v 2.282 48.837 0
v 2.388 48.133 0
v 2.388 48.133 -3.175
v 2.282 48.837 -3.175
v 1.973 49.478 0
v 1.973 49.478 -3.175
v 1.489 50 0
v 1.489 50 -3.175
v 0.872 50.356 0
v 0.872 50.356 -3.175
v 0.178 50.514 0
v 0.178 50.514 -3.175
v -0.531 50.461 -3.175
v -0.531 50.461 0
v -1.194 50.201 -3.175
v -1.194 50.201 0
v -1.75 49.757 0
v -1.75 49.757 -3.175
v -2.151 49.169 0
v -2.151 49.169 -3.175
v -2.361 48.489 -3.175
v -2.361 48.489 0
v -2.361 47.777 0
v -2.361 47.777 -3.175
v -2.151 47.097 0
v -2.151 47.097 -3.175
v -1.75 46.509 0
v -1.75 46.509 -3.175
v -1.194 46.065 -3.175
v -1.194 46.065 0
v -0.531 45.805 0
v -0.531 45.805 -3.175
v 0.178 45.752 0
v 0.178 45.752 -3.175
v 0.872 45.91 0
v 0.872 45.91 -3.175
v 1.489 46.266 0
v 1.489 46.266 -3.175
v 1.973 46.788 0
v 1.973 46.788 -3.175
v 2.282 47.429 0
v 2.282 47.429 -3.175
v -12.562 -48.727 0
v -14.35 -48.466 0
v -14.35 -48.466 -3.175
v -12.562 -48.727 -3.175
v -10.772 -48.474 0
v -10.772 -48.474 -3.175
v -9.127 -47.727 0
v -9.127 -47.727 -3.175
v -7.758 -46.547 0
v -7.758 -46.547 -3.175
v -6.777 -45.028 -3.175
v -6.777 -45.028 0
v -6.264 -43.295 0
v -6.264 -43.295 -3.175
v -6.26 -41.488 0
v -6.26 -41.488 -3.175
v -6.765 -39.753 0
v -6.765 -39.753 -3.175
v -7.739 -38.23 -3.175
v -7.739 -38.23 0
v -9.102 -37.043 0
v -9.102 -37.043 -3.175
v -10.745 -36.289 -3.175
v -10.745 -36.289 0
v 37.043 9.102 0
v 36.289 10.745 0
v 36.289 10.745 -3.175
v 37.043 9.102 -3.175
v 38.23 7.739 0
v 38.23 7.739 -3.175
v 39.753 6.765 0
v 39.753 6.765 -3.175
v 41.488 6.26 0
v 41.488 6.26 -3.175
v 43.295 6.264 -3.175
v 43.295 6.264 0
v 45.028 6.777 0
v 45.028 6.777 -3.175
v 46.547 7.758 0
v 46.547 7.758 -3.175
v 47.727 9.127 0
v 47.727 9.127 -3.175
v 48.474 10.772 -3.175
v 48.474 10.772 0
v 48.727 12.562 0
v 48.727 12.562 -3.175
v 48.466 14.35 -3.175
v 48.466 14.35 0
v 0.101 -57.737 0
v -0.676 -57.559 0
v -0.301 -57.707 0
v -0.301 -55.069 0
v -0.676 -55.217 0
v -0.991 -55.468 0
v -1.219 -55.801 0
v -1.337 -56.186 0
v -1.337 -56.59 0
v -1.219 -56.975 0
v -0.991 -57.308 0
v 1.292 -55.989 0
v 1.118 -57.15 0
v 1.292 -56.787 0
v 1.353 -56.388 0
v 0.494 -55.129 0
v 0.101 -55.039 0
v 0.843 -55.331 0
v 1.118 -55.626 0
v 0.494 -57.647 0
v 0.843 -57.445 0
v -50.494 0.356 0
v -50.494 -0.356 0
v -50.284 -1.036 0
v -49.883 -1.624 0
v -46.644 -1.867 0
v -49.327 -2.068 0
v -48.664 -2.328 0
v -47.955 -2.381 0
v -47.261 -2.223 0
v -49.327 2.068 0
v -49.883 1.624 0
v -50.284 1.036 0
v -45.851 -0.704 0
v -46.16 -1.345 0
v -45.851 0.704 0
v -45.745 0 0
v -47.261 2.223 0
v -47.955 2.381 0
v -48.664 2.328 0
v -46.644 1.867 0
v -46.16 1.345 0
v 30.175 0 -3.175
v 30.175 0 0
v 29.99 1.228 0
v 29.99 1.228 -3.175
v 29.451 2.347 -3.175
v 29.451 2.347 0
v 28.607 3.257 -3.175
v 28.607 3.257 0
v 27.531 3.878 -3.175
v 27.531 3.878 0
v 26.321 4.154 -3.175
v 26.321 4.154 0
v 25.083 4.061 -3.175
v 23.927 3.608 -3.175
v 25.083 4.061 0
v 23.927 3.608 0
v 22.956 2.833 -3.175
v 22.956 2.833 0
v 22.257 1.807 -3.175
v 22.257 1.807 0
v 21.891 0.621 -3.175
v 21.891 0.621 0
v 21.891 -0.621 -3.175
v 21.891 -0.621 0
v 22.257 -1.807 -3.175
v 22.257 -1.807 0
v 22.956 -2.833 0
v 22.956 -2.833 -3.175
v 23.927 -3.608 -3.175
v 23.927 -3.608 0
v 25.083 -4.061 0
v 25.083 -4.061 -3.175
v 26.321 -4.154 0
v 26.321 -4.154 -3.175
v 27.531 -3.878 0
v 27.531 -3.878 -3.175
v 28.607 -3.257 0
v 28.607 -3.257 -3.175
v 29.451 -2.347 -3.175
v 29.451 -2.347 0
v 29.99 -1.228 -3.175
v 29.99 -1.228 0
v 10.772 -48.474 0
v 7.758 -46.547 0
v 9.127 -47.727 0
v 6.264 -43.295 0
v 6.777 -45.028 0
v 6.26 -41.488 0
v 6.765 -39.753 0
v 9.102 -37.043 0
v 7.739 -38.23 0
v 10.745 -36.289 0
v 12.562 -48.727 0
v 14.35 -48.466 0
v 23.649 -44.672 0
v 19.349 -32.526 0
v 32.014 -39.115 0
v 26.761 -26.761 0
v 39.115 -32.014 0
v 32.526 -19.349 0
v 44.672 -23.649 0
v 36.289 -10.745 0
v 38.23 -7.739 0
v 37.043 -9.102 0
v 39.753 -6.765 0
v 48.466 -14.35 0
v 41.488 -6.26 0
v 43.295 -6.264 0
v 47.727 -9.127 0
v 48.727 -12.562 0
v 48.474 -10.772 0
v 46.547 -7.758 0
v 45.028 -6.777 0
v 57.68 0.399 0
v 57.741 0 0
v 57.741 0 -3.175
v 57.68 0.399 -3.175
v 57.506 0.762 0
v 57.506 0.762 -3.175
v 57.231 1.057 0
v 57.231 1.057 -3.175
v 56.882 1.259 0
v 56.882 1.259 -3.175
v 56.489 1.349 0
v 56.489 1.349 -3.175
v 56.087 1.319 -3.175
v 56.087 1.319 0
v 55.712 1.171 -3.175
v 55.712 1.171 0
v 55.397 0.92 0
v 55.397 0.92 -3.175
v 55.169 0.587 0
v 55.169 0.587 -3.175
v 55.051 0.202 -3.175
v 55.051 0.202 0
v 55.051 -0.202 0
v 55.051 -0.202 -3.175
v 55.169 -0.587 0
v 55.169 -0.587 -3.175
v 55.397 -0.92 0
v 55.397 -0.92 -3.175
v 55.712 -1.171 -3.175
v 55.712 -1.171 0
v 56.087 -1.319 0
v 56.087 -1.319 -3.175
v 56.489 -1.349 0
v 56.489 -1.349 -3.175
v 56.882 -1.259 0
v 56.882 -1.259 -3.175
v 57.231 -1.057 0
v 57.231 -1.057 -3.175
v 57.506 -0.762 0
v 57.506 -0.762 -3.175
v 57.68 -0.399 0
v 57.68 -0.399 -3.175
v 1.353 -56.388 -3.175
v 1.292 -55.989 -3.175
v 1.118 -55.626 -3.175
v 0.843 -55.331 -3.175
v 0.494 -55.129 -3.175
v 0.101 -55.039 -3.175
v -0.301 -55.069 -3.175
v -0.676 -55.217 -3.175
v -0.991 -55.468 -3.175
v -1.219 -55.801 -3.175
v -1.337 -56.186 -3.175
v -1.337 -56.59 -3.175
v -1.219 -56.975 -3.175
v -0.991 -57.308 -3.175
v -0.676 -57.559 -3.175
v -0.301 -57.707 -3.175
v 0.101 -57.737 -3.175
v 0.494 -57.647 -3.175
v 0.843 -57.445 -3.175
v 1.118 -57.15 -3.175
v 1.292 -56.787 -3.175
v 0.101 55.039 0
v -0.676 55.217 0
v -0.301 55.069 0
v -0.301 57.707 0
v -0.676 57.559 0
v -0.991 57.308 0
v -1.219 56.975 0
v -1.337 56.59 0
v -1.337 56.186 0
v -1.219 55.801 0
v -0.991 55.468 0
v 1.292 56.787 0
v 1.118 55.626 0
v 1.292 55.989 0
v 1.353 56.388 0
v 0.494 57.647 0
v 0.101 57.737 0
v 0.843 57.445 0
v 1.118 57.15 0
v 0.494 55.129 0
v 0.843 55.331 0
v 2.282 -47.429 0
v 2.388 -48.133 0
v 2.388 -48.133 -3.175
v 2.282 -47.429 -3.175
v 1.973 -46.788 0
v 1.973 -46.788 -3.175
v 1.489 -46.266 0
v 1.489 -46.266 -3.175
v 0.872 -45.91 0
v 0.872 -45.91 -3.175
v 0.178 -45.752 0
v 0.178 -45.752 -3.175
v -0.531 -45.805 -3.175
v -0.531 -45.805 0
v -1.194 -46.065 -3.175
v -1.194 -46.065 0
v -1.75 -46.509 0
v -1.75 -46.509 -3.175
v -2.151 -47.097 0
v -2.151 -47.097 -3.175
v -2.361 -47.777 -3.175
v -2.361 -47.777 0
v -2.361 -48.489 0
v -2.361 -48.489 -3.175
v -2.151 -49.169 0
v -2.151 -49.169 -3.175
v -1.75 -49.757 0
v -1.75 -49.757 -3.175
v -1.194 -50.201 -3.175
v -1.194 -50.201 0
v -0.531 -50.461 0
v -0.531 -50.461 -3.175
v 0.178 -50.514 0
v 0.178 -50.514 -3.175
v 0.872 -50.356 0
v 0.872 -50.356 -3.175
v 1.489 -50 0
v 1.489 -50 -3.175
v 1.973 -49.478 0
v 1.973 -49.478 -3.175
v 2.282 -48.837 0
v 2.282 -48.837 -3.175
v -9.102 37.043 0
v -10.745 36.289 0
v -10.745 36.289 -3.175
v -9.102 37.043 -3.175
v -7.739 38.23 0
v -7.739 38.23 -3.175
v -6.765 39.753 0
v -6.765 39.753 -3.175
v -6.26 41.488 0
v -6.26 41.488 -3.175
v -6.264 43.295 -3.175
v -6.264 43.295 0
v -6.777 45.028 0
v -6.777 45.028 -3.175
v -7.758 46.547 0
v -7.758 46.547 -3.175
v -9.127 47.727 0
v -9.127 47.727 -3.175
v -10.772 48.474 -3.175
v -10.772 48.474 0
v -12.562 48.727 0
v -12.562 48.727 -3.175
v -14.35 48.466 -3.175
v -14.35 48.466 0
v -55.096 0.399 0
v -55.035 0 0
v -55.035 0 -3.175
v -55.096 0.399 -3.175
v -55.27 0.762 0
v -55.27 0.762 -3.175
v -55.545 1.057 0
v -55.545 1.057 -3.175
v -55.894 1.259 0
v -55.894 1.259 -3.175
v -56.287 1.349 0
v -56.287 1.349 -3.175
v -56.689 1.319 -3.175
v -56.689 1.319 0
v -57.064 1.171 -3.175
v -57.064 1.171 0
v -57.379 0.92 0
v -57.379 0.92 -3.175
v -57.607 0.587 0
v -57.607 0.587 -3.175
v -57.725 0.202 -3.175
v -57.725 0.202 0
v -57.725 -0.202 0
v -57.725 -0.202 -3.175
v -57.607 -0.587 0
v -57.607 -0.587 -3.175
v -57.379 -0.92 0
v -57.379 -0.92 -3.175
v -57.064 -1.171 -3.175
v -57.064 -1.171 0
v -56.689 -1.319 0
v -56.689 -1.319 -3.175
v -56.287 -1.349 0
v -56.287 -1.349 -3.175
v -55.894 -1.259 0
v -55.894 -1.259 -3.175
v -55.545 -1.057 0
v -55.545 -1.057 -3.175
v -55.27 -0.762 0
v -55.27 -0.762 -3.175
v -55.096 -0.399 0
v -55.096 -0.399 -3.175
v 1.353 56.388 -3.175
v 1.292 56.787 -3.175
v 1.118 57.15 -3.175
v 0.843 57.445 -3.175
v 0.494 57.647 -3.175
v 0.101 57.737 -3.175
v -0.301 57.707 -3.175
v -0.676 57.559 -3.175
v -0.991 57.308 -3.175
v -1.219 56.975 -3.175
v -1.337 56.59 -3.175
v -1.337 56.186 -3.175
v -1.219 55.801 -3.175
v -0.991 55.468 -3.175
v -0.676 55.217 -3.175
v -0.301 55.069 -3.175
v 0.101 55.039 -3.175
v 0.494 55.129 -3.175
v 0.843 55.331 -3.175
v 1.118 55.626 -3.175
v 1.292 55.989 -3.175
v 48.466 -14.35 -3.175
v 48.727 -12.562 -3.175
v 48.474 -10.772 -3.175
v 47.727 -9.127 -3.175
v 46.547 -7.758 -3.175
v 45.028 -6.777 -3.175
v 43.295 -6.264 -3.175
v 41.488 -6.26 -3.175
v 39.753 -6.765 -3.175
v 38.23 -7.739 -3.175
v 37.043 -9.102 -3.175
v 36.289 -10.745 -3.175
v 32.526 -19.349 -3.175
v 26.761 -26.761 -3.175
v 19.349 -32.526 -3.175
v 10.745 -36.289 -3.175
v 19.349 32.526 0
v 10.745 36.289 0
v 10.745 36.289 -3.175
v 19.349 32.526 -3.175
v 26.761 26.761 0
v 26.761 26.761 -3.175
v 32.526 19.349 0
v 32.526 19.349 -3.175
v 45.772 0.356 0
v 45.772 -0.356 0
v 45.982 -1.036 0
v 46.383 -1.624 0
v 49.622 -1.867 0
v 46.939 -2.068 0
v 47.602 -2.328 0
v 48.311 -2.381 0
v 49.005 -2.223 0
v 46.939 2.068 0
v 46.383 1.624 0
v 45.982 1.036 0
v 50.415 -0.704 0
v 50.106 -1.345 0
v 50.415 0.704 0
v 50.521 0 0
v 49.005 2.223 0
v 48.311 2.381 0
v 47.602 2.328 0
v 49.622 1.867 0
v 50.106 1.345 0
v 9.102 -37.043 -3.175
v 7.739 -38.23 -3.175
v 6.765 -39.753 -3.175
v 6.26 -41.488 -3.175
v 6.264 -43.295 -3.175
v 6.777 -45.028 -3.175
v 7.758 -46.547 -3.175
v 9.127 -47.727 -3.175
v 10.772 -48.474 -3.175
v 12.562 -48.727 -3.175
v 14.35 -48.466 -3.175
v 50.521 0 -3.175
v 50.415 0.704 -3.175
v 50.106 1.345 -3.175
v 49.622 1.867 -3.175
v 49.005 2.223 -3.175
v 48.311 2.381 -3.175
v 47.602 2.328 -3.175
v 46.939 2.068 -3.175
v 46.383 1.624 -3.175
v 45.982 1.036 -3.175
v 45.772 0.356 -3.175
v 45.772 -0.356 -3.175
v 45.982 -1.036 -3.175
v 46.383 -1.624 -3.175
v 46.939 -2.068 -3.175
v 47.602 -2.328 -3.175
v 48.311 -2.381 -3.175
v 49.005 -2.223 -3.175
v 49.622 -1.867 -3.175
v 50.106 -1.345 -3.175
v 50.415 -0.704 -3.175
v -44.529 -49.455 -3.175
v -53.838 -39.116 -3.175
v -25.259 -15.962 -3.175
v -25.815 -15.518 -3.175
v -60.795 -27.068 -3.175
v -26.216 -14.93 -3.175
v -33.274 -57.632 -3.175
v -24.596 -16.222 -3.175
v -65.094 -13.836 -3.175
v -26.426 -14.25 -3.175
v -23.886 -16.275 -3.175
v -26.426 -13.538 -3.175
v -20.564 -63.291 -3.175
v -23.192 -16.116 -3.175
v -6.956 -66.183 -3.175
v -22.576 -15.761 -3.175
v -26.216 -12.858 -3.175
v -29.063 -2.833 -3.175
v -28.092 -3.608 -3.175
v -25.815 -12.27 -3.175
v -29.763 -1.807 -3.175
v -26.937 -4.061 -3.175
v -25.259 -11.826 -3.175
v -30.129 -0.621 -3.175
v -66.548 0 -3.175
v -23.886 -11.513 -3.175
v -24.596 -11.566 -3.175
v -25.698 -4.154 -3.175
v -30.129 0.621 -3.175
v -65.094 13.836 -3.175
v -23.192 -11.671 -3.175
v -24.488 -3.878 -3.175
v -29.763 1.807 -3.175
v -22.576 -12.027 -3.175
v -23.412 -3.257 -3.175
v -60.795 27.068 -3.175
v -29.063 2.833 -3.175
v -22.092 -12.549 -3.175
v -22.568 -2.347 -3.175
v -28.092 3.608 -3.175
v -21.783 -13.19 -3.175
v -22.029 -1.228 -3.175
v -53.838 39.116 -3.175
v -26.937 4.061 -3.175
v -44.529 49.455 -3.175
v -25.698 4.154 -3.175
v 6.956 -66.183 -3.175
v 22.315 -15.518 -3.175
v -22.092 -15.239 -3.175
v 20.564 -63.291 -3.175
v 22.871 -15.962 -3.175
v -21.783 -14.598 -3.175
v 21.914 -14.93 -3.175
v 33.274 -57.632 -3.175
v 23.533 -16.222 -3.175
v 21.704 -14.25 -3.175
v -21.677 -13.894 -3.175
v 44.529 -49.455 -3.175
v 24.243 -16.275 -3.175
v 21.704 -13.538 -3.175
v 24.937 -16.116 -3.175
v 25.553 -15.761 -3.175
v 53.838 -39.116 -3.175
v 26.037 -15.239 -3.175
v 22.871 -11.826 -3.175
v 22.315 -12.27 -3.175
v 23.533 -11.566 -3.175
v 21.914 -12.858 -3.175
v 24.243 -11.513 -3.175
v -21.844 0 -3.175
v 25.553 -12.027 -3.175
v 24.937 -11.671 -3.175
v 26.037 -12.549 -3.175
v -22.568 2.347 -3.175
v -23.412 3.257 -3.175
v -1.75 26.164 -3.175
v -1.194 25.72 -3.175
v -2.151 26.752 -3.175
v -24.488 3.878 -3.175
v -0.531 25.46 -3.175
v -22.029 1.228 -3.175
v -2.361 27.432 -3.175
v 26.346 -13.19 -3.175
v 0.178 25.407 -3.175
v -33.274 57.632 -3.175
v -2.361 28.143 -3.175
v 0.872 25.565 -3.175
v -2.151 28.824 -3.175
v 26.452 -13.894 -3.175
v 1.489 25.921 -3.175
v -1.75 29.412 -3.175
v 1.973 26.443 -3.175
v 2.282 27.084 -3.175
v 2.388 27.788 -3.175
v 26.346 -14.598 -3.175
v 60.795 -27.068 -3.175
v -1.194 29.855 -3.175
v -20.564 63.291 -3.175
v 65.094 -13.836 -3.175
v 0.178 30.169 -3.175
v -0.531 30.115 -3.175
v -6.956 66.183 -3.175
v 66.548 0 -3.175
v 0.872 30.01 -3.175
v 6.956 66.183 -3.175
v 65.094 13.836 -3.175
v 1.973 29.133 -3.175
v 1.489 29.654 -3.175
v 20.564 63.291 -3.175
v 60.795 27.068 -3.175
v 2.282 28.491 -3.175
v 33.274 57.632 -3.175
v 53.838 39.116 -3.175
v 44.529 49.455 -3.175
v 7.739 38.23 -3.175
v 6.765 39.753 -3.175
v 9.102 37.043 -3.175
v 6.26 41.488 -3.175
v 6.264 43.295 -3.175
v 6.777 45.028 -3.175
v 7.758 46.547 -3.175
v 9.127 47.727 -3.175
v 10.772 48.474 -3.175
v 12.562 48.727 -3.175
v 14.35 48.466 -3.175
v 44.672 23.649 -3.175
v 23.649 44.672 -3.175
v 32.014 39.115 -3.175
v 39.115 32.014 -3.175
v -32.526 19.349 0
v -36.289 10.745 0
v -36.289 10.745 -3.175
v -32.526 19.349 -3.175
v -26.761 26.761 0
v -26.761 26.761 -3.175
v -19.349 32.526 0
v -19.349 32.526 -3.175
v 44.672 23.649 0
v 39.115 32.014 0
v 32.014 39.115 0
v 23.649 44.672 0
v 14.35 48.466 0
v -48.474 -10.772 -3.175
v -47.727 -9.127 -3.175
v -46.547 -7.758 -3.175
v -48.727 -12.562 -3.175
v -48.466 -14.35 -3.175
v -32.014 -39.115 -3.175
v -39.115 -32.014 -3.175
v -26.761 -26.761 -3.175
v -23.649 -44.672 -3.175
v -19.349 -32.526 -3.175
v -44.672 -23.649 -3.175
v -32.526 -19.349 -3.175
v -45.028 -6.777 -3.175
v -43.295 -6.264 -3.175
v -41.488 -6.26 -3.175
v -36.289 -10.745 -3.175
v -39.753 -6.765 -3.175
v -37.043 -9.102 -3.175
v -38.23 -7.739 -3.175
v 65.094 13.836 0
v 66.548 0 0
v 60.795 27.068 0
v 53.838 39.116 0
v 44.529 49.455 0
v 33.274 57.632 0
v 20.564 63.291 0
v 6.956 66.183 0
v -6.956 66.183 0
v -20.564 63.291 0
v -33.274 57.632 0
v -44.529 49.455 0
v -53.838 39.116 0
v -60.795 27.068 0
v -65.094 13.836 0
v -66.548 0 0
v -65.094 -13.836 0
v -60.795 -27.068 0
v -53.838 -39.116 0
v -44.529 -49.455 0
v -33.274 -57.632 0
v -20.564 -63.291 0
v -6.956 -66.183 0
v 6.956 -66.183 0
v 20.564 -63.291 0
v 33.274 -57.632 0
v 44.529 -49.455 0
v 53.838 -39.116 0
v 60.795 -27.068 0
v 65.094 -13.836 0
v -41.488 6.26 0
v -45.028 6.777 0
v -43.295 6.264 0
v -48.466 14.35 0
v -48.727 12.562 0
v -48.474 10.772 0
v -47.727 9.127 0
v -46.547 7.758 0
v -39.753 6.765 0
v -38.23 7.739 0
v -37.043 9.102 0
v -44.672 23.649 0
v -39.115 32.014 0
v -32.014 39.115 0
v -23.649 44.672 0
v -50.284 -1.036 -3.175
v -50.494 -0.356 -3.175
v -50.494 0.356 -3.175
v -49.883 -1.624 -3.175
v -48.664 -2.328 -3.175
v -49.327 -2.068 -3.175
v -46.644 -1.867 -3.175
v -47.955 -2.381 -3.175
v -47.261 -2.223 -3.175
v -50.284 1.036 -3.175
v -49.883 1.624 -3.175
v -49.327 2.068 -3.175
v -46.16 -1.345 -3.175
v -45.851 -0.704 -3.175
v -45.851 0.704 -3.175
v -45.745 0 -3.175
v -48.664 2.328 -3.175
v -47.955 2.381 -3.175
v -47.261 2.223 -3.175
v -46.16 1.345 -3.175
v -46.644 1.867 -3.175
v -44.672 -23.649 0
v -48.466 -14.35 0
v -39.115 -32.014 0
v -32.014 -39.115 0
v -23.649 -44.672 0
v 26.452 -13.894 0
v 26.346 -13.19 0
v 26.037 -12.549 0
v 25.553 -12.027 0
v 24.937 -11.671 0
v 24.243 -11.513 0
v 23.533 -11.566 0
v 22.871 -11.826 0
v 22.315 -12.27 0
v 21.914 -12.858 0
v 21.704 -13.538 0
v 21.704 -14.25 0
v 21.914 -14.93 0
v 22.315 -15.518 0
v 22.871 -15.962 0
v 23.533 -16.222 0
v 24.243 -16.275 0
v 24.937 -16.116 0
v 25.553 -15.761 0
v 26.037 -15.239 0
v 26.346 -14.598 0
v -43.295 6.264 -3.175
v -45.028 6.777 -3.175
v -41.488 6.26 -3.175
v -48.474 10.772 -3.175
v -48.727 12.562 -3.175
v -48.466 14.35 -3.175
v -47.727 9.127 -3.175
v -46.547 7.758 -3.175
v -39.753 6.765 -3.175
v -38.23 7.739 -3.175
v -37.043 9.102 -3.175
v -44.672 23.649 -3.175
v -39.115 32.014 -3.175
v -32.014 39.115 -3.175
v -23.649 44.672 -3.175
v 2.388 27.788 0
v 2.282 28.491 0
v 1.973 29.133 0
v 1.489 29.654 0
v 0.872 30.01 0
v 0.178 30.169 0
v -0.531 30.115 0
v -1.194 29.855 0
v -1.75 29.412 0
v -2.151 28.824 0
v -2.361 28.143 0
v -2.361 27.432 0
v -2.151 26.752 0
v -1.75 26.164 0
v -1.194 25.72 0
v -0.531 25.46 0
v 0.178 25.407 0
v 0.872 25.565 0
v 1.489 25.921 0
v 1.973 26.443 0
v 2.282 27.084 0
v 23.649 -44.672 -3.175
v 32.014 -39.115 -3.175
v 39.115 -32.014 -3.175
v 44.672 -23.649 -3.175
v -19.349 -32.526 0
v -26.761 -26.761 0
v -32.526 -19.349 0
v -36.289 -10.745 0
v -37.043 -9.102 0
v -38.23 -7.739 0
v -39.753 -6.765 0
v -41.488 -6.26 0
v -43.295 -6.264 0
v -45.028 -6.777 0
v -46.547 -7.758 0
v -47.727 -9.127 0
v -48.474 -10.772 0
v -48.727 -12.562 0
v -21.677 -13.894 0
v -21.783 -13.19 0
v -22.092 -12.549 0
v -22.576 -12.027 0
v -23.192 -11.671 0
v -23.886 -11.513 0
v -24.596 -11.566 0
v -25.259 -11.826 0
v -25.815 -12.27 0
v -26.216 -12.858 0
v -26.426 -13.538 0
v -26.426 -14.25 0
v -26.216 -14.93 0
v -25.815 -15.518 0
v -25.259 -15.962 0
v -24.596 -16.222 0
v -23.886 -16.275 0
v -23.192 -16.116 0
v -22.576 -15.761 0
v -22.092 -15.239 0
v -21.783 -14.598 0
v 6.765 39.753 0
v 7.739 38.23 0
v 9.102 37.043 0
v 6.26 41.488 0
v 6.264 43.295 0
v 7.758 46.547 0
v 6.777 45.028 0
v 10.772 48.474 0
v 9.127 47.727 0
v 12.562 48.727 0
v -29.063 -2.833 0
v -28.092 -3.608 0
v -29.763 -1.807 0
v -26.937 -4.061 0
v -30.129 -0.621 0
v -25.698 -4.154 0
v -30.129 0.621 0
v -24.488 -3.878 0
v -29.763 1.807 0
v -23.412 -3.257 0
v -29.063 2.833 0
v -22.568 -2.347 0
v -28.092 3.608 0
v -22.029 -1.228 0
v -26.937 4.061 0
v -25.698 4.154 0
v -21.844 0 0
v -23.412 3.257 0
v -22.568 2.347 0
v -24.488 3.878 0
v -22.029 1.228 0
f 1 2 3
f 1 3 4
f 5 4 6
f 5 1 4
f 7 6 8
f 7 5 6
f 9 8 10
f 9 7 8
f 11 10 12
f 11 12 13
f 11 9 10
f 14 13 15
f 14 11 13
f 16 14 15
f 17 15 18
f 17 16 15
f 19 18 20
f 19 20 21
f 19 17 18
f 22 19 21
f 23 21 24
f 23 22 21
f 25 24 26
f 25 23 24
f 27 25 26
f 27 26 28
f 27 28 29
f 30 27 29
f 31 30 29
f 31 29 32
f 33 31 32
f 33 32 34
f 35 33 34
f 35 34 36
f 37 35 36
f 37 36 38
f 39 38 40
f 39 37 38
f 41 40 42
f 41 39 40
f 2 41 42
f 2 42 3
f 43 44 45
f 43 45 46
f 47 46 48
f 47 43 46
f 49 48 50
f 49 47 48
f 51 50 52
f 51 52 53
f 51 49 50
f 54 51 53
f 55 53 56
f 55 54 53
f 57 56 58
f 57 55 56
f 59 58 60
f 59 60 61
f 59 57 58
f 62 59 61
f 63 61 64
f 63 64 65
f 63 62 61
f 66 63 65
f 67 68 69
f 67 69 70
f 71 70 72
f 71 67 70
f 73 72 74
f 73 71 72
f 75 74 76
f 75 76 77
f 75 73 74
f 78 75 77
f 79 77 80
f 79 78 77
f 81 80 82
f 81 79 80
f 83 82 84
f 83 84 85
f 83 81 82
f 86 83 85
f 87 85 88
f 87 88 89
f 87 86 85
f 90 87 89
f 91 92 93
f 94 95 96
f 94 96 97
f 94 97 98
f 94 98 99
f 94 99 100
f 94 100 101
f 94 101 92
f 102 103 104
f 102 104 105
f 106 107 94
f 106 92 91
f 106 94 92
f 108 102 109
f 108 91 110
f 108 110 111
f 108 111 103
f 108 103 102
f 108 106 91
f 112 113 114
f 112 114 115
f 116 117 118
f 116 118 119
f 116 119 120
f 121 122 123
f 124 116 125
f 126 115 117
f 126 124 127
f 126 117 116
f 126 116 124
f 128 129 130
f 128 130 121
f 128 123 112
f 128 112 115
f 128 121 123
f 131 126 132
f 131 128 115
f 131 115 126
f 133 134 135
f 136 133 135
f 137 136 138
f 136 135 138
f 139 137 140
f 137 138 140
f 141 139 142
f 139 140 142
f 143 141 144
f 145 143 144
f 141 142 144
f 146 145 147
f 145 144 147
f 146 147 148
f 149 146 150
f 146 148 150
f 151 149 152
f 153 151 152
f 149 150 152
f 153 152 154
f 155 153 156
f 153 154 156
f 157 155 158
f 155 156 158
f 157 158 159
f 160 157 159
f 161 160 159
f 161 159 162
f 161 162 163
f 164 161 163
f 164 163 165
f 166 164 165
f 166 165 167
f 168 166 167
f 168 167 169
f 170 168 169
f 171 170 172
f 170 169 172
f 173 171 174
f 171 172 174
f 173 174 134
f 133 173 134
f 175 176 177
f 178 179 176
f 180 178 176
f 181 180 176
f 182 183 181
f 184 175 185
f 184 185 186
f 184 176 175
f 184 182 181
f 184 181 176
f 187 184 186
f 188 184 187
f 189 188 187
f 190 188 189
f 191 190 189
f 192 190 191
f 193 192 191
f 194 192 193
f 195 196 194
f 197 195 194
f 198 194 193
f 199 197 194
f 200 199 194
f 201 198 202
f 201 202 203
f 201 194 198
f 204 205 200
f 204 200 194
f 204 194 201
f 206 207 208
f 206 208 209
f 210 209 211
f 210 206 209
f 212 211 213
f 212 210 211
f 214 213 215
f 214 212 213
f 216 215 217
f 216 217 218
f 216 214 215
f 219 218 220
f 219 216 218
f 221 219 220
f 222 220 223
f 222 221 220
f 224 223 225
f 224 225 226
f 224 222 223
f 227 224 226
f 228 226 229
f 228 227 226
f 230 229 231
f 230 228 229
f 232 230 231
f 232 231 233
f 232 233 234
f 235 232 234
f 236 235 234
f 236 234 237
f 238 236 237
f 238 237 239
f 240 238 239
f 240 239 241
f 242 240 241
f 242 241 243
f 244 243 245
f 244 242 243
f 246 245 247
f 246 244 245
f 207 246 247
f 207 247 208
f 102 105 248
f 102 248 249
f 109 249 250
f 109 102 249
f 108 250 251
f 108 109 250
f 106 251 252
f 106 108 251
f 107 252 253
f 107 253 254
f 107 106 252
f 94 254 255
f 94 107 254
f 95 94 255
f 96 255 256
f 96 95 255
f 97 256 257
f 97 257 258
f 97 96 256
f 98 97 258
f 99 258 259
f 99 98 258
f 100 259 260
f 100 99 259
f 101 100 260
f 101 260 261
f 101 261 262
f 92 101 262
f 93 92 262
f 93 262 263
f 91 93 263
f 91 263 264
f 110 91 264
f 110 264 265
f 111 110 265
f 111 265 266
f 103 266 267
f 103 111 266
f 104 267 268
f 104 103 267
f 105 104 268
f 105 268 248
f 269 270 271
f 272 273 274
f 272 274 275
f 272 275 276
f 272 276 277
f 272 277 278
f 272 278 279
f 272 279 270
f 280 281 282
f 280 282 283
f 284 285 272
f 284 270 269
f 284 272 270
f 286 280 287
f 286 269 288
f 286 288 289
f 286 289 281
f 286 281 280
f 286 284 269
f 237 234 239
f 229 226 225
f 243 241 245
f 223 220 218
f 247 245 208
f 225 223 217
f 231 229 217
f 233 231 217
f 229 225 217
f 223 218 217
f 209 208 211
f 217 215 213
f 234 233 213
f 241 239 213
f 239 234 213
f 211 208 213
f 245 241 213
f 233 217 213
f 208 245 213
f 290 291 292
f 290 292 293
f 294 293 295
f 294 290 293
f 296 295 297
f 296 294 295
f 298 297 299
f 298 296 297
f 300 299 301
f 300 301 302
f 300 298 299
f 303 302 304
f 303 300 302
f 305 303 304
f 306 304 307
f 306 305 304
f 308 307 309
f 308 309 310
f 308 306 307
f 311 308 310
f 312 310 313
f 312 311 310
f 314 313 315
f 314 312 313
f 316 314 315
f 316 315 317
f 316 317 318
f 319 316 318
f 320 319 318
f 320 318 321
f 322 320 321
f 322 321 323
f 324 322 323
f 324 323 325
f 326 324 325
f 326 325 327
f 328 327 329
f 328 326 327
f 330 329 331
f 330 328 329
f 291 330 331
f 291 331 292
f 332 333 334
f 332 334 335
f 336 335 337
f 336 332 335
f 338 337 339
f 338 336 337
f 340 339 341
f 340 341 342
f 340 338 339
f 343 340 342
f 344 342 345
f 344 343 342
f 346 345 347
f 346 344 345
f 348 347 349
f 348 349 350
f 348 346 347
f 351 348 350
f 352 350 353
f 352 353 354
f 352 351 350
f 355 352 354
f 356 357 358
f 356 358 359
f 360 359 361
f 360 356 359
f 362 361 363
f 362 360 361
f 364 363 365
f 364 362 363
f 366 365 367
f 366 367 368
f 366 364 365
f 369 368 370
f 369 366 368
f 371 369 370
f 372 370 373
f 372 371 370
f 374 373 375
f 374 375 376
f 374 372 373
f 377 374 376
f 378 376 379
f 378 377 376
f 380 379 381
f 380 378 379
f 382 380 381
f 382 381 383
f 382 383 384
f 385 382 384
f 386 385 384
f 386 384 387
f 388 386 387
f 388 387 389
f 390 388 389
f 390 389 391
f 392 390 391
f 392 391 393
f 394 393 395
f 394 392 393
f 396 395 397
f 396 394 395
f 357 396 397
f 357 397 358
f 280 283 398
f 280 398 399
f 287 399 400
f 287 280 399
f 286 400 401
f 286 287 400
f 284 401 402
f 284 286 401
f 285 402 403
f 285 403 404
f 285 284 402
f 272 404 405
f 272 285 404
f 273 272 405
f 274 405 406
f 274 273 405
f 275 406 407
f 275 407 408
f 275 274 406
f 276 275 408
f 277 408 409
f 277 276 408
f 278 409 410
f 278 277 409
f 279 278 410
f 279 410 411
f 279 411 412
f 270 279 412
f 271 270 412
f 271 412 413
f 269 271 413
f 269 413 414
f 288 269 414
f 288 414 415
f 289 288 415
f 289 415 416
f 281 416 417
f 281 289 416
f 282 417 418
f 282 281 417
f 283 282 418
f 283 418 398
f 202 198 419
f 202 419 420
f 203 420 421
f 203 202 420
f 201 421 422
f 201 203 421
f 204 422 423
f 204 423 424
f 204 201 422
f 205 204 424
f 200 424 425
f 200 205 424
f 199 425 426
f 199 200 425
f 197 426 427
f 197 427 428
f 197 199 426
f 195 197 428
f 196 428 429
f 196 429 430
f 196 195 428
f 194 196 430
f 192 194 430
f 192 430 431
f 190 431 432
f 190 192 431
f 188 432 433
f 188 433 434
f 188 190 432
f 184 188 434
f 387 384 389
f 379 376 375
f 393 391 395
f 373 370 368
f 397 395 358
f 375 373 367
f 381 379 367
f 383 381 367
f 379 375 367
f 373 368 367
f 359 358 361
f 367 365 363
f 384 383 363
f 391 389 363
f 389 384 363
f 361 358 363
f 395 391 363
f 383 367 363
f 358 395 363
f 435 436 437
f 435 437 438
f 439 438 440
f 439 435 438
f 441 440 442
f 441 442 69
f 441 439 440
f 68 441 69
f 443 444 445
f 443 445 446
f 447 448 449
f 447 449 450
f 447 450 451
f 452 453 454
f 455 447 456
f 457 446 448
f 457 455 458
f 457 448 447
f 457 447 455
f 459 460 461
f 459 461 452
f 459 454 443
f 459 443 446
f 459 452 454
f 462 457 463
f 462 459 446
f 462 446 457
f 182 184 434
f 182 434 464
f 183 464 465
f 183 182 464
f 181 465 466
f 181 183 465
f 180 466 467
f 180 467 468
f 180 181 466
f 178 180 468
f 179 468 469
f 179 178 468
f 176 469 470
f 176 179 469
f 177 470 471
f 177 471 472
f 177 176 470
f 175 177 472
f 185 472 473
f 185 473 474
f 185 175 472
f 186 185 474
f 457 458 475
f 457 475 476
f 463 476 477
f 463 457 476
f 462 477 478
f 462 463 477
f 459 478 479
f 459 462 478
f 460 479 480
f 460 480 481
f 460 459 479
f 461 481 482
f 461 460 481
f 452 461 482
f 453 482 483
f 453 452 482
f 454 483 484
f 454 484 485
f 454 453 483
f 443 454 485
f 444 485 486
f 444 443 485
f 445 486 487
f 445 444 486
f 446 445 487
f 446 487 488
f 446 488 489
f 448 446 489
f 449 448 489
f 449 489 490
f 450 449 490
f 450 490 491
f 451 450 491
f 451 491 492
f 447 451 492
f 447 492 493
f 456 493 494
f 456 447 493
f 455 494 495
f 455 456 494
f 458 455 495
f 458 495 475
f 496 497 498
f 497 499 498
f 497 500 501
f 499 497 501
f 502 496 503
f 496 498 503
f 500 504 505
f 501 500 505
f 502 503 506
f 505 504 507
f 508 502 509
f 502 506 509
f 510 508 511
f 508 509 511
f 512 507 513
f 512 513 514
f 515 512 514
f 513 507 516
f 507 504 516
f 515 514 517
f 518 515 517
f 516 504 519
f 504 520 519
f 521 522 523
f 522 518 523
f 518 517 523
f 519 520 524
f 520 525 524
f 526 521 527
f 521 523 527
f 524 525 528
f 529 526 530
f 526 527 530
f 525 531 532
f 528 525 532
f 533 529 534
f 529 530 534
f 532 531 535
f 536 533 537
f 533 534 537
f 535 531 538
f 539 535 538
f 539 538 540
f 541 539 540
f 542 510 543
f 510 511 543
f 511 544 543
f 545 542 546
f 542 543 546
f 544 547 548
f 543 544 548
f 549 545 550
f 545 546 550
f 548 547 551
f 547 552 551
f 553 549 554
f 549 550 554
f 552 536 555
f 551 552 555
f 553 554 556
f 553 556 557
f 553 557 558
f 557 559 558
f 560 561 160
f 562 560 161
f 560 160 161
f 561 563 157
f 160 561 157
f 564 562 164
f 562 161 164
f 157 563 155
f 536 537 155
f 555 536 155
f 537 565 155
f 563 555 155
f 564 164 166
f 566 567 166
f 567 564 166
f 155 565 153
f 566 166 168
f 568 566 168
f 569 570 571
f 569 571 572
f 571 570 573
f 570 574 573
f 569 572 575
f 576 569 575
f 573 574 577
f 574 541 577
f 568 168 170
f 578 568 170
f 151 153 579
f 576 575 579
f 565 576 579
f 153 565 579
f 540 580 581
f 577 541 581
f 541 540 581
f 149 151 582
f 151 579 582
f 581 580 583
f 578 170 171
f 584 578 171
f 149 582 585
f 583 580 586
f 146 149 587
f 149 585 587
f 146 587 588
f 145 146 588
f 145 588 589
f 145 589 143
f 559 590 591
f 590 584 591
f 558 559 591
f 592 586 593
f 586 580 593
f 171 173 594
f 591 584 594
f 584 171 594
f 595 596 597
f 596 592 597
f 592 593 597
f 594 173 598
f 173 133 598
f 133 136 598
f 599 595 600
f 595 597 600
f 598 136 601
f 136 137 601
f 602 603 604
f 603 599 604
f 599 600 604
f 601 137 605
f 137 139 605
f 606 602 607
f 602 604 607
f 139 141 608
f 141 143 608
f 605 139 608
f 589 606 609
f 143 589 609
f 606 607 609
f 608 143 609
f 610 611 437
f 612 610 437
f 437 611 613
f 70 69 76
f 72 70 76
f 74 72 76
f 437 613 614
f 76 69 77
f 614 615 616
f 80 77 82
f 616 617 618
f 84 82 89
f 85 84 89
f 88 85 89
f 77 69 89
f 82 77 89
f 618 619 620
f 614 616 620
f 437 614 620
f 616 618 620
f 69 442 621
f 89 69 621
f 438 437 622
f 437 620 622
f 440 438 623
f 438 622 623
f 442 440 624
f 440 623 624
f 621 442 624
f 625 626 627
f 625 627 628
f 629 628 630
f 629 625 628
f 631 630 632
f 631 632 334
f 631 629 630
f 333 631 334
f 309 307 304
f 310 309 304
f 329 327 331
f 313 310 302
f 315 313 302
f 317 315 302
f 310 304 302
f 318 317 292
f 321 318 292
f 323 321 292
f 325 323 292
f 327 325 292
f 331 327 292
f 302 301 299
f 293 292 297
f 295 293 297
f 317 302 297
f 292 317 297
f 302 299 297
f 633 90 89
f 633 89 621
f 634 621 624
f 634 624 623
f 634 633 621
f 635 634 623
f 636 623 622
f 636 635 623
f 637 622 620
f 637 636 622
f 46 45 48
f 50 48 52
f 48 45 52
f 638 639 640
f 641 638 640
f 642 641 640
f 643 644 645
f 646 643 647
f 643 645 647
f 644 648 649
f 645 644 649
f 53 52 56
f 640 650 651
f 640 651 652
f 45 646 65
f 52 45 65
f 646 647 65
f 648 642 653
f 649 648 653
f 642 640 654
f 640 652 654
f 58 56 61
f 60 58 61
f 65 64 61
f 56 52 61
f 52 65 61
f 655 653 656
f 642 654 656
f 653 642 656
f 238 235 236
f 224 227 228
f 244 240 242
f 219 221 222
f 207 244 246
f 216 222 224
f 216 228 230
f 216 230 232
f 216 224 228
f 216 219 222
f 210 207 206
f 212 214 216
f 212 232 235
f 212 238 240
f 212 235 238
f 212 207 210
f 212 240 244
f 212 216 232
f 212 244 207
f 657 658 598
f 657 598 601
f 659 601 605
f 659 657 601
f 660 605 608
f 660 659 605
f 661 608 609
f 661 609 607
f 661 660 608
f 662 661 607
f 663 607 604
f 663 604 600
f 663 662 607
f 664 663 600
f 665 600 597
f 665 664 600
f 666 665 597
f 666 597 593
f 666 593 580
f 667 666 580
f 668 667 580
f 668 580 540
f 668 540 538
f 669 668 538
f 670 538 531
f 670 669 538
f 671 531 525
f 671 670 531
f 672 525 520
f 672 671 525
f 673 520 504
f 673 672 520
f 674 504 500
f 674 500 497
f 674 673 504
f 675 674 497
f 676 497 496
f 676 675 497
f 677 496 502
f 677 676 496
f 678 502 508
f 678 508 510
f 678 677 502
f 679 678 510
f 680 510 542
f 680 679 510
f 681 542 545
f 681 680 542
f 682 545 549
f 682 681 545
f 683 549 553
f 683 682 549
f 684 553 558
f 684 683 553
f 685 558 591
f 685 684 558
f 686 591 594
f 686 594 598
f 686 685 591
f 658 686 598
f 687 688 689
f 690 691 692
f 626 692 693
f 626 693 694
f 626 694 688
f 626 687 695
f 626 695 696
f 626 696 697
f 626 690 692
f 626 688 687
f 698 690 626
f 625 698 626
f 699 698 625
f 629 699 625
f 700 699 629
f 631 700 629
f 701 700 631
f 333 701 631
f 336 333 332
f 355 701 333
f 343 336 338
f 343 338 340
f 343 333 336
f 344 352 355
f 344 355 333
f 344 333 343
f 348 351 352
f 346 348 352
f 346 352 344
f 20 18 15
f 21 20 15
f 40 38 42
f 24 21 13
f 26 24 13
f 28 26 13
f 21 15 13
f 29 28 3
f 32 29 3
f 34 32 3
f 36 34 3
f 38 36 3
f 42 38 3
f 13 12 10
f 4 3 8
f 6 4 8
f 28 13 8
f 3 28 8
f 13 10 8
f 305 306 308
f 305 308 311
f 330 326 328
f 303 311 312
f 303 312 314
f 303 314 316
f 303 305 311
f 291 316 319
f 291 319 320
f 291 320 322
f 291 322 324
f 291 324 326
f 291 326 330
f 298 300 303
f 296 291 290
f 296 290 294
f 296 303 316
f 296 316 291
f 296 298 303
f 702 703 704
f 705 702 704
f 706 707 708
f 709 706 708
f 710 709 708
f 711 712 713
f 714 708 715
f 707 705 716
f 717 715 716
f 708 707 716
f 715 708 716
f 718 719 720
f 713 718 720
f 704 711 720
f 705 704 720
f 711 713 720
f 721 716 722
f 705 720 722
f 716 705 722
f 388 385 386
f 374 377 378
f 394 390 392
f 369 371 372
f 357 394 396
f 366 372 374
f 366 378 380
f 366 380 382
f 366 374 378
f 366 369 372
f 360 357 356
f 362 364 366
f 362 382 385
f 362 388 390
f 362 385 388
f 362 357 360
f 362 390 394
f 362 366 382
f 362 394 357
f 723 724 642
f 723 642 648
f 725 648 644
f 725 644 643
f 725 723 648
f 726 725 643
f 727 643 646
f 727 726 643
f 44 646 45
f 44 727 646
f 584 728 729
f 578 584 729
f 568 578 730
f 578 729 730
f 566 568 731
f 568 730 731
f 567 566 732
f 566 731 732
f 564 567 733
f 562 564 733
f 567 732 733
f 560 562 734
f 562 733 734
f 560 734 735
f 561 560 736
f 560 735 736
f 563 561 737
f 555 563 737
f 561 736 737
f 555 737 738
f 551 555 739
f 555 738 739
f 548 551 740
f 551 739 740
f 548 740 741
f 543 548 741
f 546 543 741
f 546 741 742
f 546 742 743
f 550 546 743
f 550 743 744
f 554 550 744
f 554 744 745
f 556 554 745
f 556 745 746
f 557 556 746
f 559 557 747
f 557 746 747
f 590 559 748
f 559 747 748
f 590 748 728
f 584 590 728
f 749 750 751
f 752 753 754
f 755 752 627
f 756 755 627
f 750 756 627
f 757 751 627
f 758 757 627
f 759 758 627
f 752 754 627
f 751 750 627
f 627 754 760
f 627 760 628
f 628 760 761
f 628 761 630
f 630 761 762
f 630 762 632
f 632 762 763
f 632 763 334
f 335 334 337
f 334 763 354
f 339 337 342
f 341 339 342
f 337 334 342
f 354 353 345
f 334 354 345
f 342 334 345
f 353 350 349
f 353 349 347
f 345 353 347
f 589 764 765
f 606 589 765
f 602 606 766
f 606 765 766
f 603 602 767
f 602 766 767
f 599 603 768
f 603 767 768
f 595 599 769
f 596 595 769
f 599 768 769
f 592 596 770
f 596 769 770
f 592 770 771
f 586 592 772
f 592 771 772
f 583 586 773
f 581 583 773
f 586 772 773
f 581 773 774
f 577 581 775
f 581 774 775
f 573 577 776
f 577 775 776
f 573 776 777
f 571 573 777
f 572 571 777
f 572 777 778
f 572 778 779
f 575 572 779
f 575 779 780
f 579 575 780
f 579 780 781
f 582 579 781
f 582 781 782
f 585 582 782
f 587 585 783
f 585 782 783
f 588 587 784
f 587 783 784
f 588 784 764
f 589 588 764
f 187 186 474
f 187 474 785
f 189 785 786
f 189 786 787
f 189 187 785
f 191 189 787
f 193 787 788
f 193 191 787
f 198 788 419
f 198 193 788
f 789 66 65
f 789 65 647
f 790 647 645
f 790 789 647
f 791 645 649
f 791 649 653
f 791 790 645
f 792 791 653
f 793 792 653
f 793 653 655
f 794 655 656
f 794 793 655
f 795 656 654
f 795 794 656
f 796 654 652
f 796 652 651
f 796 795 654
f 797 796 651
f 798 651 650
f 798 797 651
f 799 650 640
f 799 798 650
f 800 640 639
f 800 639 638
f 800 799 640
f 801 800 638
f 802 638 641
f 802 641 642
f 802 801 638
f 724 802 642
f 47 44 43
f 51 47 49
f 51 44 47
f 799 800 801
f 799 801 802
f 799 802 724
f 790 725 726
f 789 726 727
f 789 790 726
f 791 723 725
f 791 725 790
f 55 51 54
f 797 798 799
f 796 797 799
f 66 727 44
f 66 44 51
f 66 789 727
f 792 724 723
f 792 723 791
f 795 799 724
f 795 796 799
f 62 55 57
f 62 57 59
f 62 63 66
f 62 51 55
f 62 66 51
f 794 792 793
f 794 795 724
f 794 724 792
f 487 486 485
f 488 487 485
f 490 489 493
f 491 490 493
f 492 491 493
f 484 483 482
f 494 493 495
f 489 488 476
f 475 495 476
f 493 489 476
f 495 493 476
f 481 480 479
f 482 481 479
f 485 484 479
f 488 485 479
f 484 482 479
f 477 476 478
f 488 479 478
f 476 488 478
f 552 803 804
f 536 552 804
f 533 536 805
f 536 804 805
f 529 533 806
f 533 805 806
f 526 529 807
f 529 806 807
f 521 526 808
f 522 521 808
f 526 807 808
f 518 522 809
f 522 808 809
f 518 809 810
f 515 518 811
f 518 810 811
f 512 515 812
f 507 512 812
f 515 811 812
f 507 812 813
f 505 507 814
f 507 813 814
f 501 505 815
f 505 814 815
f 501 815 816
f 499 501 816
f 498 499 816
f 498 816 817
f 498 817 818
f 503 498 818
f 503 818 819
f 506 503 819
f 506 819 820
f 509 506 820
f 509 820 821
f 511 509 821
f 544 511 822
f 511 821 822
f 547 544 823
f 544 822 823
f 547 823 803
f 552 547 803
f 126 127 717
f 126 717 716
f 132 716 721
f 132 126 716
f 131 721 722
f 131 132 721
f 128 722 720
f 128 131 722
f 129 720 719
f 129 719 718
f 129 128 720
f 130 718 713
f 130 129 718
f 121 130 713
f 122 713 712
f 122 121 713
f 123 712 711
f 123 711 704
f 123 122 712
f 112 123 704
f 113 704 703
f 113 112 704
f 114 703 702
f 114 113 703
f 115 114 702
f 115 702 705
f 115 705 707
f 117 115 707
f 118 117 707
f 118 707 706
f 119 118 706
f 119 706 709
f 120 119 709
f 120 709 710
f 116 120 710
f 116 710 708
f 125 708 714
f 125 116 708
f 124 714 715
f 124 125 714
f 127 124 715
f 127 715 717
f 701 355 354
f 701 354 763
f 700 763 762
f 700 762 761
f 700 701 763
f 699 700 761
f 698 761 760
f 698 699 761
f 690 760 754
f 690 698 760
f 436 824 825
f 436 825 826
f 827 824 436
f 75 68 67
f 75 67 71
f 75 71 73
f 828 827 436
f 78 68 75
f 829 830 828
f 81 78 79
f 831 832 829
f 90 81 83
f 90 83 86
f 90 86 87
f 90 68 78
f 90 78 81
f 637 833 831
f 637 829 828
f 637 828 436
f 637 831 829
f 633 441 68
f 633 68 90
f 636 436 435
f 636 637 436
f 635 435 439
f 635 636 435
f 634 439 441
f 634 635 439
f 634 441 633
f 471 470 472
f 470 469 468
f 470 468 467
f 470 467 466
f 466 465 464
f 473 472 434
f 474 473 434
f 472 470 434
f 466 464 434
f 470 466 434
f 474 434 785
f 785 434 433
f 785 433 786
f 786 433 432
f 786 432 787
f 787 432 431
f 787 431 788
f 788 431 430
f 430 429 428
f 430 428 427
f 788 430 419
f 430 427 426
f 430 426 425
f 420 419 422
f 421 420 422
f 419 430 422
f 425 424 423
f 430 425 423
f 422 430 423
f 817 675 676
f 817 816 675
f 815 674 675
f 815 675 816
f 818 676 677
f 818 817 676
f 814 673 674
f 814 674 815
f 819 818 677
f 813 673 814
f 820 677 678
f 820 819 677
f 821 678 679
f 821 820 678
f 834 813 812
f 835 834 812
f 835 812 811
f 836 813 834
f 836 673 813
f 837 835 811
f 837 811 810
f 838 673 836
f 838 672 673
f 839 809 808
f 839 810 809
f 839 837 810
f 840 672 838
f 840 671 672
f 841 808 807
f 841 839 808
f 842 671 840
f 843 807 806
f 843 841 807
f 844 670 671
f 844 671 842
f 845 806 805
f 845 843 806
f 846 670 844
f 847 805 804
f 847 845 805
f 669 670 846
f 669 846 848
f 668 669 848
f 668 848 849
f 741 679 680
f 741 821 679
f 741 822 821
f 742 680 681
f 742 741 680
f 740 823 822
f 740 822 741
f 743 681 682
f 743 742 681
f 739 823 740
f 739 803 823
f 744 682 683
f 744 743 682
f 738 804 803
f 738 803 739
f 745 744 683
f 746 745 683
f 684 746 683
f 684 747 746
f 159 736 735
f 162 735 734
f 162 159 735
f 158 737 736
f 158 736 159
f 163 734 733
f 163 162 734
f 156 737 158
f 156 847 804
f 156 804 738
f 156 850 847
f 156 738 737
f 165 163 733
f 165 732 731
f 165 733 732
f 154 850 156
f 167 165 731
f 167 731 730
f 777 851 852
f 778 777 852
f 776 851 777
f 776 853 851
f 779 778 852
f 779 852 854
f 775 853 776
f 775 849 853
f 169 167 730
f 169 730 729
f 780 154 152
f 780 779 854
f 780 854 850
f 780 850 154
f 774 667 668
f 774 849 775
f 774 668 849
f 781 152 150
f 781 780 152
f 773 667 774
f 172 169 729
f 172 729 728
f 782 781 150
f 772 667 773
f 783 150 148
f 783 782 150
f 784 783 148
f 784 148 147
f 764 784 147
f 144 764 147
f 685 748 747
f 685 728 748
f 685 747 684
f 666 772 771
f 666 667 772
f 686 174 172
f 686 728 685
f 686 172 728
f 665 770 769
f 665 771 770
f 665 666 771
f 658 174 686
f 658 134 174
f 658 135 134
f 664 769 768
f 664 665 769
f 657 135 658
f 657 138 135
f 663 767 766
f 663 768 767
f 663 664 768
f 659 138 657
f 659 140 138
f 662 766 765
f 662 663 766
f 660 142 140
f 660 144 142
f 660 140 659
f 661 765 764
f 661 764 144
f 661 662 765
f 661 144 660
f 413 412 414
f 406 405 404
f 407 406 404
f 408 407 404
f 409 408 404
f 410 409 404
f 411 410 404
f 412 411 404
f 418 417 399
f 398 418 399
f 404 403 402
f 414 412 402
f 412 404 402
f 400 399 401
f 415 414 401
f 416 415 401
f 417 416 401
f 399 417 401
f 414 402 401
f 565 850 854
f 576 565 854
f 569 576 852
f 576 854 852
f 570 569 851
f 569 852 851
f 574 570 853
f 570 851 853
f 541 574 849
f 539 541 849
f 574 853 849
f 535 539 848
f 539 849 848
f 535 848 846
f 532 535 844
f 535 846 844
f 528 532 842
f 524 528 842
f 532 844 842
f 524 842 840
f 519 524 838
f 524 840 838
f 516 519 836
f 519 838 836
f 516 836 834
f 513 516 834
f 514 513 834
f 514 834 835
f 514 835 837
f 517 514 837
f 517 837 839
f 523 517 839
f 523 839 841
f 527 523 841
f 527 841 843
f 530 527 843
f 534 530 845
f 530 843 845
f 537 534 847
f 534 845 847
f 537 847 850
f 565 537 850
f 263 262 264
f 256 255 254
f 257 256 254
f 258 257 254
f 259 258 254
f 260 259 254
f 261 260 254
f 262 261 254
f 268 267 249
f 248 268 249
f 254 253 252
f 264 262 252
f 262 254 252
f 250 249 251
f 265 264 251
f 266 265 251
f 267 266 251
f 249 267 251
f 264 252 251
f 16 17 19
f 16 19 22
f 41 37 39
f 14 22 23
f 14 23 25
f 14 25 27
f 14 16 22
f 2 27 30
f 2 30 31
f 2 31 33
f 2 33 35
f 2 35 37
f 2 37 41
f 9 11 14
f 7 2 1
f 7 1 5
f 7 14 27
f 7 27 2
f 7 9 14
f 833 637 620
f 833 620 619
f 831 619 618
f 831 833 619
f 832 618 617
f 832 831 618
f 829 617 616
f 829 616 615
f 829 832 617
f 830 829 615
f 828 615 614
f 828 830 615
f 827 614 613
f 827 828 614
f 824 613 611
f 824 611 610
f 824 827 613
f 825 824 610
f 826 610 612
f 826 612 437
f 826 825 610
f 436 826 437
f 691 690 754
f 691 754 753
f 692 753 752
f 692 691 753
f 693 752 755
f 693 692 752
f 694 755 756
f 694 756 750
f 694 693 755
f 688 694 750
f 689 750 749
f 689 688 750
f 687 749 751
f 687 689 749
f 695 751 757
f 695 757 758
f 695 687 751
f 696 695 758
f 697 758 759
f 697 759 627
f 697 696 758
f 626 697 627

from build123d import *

# Parameters (mm, degrees)
F0_R     = 66.548
F0_R_2   = 2.3876
F0_R_3   = 4.1656
F3_DEPTH = 3.175
F2_R     = 2.3876
F2_R_2   = 1.35255


with BuildPart() as f3:
    # F0 (on Top) → F3 (new body)
    with BuildSketch(Plane.XY):
        Circle(F0_R)
        with Locations((-24.0647675102, -13.8938)):
            Circle(F0_R_2, mode=Mode.SUBTRACT)
        with Locations((24.0647675102, -13.8938)):
            Circle(F0_R_2, mode=Mode.SUBTRACT)
        with Locations((-26.0096, 0)):
            Circle(F0_R_3, mode=Mode.SUBTRACT)
        with Locations((26.0096, 0)):
            Circle(F0_R_3, mode=Mode.SUBTRACT)
        with Locations((0, 27.7876)):
            Circle(F0_R_2, mode=Mode.SUBTRACT)
    extrude(amount=-F3_DEPTH)


with BuildPart() as f3b:
    # F1 (on Top) → F3, piece 2 (new body)
    with BuildSketch(Plane.XY):
        with BuildLine():
            ThreePointArc((48.4661085088, 14.350416092), (35.7414193619, 35.7414193619), (14.350416092, 48.4661085088))
            ThreePointArc((14.350416092, 48.4661085088), (6.4588929009, 44.1802175017), (10.744783908, 36.2886943106))
            ThreePointArc((10.744783908, 36.2886943106), (26.7611632408, 26.7611632408), (36.2886943106, 10.744783908))
            ThreePointArc((36.2886943106, 10.744783908), (44.1802175017, 6.4588929009), (48.4661085088, 14.350416092))
        make_face()
    extrude(amount=-F3_DEPTH)


with BuildPart() as f3c:
    # F1 (on Top) → F3, piece 3 (new body)
    with BuildSketch(Plane.XY):
        with BuildLine():
            ThreePointArc((14.350416092, -48.4661085088), (35.7414193619, -35.7414193619), (48.4661085088, -14.350416092))
            ThreePointArc((48.4661085088, -14.350416092), (44.1802175017, -6.4588929009), (36.2886943106, -10.744783908))
            ThreePointArc((36.2886943106, -10.744783908), (26.7611632408, -26.7611632408), (10.744783908, -36.2886943106))
            ThreePointArc((10.744783908, -36.2886943106), (6.4588929009, -44.1802175017), (14.350416092, -48.4661085088))
        make_face()
    extrude(amount=-F3_DEPTH)


with BuildPart() as f3d:
    # F1 (on Top) → F3, piece 4 (new body)
    with BuildSketch(Plane.XY):
        with BuildLine():
            ThreePointArc((-48.4661085088, -14.350416092), (-35.7414193619, -35.7414193619), (-14.350416092, -48.4661085088))
            ThreePointArc((-14.350416092, -48.4661085088), (-6.4588929009, -44.1802175017), (-10.744783908, -36.2886943106))
            ThreePointArc((-10.744783908, -36.2886943106), (-26.7611632408, -26.7611632408), (-36.2886943106, -10.744783908))
            ThreePointArc((-36.2886943106, -10.744783908), (-44.1802175017, -6.4588929009), (-48.4661085088, -14.350416092))
        make_face()
    extrude(amount=-F3_DEPTH)


with BuildPart() as f3e:
    # F1 (on Top) → F3, piece 5 (new body)
    with BuildSketch(Plane.XY):
        with BuildLine():
            ThreePointArc((-14.350416092, 48.4661085088), (-35.7414193619, 35.7414193619), (-48.4661085088, 14.350416092))
            ThreePointArc((-48.4661085088, 14.350416092), (-44.1802175017, 6.4588929009), (-36.2886943106, 10.744783908))
            ThreePointArc((-36.2886943106, 10.744783908), (-26.7611632408, 26.7611632408), (-10.744783908, 36.2886943106))
            ThreePointArc((-10.744783908, 36.2886943106), (-6.4588929009, 44.1802175017), (-14.350416092, 48.4661085088))
        make_face()
    extrude(amount=-F3_DEPTH)


with BuildPart() as f3f:
    # F2 (on Top) → F3, piece 6 (new body)
    with BuildSketch(Plane.XY):
        with Locations((0, -48.133)):
            Circle(F2_R)
    extrude(amount=-F3_DEPTH)


with BuildPart() as f3g:
    # F2 (on Top) → F3, piece 7 (new body)
    with BuildSketch(Plane.XY):
        with Locations((-48.133, 0)):
            Circle(F2_R)
    extrude(amount=-F3_DEPTH)


with BuildPart() as f3h:
    # F2 (on Top) → F3, piece 8 (new body)
    with BuildSketch(Plane.XY):
        with Locations((48.133, 0)):
            Circle(F2_R)
    extrude(amount=-F3_DEPTH)


with BuildPart() as f3i:
    # F2 (on Top) → F3, piece 9 (new body)
    with BuildSketch(Plane.XY):
        with Locations((0, 48.133)):
            Circle(F2_R)
    extrude(amount=-F3_DEPTH)


with BuildPart() as f3j:
    # F2 (on Top) → F3, piece 10 (new body)
    with BuildSketch(Plane.XY):
        with Locations((0, -56.388)):
            Circle(F2_R_2)
    extrude(amount=-F3_DEPTH)


with BuildPart() as f3k:
    # F2 (on Top) → F3, piece 11 (new body)
    with BuildSketch(Plane.XY):
        with Locations((56.388, 0)):
            Circle(F2_R_2)
    extrude(amount=-F3_DEPTH)


with BuildPart() as f3l:
    # F2 (on Top) → F3, piece 12 (new body)
    with BuildSketch(Plane.XY):
        with Locations((0, 56.388)):
            Circle(F2_R_2)
    extrude(amount=-F3_DEPTH)


with BuildPart() as f3m:
    # F2 (on Top) → F3, piece 13 (new body)
    with BuildSketch(Plane.XY):
        with Locations((-56.388, 0)):
            Circle(F2_R_2)
    extrude(amount=-F3_DEPTH)


solid = Compound([f3.part, f3b.part, f3c.part, f3d.part, f3e.part, f3f.part, f3g.part, f3h.part, f3i.part, f3j.part, f3k.part, f3l.part, f3m.part])
